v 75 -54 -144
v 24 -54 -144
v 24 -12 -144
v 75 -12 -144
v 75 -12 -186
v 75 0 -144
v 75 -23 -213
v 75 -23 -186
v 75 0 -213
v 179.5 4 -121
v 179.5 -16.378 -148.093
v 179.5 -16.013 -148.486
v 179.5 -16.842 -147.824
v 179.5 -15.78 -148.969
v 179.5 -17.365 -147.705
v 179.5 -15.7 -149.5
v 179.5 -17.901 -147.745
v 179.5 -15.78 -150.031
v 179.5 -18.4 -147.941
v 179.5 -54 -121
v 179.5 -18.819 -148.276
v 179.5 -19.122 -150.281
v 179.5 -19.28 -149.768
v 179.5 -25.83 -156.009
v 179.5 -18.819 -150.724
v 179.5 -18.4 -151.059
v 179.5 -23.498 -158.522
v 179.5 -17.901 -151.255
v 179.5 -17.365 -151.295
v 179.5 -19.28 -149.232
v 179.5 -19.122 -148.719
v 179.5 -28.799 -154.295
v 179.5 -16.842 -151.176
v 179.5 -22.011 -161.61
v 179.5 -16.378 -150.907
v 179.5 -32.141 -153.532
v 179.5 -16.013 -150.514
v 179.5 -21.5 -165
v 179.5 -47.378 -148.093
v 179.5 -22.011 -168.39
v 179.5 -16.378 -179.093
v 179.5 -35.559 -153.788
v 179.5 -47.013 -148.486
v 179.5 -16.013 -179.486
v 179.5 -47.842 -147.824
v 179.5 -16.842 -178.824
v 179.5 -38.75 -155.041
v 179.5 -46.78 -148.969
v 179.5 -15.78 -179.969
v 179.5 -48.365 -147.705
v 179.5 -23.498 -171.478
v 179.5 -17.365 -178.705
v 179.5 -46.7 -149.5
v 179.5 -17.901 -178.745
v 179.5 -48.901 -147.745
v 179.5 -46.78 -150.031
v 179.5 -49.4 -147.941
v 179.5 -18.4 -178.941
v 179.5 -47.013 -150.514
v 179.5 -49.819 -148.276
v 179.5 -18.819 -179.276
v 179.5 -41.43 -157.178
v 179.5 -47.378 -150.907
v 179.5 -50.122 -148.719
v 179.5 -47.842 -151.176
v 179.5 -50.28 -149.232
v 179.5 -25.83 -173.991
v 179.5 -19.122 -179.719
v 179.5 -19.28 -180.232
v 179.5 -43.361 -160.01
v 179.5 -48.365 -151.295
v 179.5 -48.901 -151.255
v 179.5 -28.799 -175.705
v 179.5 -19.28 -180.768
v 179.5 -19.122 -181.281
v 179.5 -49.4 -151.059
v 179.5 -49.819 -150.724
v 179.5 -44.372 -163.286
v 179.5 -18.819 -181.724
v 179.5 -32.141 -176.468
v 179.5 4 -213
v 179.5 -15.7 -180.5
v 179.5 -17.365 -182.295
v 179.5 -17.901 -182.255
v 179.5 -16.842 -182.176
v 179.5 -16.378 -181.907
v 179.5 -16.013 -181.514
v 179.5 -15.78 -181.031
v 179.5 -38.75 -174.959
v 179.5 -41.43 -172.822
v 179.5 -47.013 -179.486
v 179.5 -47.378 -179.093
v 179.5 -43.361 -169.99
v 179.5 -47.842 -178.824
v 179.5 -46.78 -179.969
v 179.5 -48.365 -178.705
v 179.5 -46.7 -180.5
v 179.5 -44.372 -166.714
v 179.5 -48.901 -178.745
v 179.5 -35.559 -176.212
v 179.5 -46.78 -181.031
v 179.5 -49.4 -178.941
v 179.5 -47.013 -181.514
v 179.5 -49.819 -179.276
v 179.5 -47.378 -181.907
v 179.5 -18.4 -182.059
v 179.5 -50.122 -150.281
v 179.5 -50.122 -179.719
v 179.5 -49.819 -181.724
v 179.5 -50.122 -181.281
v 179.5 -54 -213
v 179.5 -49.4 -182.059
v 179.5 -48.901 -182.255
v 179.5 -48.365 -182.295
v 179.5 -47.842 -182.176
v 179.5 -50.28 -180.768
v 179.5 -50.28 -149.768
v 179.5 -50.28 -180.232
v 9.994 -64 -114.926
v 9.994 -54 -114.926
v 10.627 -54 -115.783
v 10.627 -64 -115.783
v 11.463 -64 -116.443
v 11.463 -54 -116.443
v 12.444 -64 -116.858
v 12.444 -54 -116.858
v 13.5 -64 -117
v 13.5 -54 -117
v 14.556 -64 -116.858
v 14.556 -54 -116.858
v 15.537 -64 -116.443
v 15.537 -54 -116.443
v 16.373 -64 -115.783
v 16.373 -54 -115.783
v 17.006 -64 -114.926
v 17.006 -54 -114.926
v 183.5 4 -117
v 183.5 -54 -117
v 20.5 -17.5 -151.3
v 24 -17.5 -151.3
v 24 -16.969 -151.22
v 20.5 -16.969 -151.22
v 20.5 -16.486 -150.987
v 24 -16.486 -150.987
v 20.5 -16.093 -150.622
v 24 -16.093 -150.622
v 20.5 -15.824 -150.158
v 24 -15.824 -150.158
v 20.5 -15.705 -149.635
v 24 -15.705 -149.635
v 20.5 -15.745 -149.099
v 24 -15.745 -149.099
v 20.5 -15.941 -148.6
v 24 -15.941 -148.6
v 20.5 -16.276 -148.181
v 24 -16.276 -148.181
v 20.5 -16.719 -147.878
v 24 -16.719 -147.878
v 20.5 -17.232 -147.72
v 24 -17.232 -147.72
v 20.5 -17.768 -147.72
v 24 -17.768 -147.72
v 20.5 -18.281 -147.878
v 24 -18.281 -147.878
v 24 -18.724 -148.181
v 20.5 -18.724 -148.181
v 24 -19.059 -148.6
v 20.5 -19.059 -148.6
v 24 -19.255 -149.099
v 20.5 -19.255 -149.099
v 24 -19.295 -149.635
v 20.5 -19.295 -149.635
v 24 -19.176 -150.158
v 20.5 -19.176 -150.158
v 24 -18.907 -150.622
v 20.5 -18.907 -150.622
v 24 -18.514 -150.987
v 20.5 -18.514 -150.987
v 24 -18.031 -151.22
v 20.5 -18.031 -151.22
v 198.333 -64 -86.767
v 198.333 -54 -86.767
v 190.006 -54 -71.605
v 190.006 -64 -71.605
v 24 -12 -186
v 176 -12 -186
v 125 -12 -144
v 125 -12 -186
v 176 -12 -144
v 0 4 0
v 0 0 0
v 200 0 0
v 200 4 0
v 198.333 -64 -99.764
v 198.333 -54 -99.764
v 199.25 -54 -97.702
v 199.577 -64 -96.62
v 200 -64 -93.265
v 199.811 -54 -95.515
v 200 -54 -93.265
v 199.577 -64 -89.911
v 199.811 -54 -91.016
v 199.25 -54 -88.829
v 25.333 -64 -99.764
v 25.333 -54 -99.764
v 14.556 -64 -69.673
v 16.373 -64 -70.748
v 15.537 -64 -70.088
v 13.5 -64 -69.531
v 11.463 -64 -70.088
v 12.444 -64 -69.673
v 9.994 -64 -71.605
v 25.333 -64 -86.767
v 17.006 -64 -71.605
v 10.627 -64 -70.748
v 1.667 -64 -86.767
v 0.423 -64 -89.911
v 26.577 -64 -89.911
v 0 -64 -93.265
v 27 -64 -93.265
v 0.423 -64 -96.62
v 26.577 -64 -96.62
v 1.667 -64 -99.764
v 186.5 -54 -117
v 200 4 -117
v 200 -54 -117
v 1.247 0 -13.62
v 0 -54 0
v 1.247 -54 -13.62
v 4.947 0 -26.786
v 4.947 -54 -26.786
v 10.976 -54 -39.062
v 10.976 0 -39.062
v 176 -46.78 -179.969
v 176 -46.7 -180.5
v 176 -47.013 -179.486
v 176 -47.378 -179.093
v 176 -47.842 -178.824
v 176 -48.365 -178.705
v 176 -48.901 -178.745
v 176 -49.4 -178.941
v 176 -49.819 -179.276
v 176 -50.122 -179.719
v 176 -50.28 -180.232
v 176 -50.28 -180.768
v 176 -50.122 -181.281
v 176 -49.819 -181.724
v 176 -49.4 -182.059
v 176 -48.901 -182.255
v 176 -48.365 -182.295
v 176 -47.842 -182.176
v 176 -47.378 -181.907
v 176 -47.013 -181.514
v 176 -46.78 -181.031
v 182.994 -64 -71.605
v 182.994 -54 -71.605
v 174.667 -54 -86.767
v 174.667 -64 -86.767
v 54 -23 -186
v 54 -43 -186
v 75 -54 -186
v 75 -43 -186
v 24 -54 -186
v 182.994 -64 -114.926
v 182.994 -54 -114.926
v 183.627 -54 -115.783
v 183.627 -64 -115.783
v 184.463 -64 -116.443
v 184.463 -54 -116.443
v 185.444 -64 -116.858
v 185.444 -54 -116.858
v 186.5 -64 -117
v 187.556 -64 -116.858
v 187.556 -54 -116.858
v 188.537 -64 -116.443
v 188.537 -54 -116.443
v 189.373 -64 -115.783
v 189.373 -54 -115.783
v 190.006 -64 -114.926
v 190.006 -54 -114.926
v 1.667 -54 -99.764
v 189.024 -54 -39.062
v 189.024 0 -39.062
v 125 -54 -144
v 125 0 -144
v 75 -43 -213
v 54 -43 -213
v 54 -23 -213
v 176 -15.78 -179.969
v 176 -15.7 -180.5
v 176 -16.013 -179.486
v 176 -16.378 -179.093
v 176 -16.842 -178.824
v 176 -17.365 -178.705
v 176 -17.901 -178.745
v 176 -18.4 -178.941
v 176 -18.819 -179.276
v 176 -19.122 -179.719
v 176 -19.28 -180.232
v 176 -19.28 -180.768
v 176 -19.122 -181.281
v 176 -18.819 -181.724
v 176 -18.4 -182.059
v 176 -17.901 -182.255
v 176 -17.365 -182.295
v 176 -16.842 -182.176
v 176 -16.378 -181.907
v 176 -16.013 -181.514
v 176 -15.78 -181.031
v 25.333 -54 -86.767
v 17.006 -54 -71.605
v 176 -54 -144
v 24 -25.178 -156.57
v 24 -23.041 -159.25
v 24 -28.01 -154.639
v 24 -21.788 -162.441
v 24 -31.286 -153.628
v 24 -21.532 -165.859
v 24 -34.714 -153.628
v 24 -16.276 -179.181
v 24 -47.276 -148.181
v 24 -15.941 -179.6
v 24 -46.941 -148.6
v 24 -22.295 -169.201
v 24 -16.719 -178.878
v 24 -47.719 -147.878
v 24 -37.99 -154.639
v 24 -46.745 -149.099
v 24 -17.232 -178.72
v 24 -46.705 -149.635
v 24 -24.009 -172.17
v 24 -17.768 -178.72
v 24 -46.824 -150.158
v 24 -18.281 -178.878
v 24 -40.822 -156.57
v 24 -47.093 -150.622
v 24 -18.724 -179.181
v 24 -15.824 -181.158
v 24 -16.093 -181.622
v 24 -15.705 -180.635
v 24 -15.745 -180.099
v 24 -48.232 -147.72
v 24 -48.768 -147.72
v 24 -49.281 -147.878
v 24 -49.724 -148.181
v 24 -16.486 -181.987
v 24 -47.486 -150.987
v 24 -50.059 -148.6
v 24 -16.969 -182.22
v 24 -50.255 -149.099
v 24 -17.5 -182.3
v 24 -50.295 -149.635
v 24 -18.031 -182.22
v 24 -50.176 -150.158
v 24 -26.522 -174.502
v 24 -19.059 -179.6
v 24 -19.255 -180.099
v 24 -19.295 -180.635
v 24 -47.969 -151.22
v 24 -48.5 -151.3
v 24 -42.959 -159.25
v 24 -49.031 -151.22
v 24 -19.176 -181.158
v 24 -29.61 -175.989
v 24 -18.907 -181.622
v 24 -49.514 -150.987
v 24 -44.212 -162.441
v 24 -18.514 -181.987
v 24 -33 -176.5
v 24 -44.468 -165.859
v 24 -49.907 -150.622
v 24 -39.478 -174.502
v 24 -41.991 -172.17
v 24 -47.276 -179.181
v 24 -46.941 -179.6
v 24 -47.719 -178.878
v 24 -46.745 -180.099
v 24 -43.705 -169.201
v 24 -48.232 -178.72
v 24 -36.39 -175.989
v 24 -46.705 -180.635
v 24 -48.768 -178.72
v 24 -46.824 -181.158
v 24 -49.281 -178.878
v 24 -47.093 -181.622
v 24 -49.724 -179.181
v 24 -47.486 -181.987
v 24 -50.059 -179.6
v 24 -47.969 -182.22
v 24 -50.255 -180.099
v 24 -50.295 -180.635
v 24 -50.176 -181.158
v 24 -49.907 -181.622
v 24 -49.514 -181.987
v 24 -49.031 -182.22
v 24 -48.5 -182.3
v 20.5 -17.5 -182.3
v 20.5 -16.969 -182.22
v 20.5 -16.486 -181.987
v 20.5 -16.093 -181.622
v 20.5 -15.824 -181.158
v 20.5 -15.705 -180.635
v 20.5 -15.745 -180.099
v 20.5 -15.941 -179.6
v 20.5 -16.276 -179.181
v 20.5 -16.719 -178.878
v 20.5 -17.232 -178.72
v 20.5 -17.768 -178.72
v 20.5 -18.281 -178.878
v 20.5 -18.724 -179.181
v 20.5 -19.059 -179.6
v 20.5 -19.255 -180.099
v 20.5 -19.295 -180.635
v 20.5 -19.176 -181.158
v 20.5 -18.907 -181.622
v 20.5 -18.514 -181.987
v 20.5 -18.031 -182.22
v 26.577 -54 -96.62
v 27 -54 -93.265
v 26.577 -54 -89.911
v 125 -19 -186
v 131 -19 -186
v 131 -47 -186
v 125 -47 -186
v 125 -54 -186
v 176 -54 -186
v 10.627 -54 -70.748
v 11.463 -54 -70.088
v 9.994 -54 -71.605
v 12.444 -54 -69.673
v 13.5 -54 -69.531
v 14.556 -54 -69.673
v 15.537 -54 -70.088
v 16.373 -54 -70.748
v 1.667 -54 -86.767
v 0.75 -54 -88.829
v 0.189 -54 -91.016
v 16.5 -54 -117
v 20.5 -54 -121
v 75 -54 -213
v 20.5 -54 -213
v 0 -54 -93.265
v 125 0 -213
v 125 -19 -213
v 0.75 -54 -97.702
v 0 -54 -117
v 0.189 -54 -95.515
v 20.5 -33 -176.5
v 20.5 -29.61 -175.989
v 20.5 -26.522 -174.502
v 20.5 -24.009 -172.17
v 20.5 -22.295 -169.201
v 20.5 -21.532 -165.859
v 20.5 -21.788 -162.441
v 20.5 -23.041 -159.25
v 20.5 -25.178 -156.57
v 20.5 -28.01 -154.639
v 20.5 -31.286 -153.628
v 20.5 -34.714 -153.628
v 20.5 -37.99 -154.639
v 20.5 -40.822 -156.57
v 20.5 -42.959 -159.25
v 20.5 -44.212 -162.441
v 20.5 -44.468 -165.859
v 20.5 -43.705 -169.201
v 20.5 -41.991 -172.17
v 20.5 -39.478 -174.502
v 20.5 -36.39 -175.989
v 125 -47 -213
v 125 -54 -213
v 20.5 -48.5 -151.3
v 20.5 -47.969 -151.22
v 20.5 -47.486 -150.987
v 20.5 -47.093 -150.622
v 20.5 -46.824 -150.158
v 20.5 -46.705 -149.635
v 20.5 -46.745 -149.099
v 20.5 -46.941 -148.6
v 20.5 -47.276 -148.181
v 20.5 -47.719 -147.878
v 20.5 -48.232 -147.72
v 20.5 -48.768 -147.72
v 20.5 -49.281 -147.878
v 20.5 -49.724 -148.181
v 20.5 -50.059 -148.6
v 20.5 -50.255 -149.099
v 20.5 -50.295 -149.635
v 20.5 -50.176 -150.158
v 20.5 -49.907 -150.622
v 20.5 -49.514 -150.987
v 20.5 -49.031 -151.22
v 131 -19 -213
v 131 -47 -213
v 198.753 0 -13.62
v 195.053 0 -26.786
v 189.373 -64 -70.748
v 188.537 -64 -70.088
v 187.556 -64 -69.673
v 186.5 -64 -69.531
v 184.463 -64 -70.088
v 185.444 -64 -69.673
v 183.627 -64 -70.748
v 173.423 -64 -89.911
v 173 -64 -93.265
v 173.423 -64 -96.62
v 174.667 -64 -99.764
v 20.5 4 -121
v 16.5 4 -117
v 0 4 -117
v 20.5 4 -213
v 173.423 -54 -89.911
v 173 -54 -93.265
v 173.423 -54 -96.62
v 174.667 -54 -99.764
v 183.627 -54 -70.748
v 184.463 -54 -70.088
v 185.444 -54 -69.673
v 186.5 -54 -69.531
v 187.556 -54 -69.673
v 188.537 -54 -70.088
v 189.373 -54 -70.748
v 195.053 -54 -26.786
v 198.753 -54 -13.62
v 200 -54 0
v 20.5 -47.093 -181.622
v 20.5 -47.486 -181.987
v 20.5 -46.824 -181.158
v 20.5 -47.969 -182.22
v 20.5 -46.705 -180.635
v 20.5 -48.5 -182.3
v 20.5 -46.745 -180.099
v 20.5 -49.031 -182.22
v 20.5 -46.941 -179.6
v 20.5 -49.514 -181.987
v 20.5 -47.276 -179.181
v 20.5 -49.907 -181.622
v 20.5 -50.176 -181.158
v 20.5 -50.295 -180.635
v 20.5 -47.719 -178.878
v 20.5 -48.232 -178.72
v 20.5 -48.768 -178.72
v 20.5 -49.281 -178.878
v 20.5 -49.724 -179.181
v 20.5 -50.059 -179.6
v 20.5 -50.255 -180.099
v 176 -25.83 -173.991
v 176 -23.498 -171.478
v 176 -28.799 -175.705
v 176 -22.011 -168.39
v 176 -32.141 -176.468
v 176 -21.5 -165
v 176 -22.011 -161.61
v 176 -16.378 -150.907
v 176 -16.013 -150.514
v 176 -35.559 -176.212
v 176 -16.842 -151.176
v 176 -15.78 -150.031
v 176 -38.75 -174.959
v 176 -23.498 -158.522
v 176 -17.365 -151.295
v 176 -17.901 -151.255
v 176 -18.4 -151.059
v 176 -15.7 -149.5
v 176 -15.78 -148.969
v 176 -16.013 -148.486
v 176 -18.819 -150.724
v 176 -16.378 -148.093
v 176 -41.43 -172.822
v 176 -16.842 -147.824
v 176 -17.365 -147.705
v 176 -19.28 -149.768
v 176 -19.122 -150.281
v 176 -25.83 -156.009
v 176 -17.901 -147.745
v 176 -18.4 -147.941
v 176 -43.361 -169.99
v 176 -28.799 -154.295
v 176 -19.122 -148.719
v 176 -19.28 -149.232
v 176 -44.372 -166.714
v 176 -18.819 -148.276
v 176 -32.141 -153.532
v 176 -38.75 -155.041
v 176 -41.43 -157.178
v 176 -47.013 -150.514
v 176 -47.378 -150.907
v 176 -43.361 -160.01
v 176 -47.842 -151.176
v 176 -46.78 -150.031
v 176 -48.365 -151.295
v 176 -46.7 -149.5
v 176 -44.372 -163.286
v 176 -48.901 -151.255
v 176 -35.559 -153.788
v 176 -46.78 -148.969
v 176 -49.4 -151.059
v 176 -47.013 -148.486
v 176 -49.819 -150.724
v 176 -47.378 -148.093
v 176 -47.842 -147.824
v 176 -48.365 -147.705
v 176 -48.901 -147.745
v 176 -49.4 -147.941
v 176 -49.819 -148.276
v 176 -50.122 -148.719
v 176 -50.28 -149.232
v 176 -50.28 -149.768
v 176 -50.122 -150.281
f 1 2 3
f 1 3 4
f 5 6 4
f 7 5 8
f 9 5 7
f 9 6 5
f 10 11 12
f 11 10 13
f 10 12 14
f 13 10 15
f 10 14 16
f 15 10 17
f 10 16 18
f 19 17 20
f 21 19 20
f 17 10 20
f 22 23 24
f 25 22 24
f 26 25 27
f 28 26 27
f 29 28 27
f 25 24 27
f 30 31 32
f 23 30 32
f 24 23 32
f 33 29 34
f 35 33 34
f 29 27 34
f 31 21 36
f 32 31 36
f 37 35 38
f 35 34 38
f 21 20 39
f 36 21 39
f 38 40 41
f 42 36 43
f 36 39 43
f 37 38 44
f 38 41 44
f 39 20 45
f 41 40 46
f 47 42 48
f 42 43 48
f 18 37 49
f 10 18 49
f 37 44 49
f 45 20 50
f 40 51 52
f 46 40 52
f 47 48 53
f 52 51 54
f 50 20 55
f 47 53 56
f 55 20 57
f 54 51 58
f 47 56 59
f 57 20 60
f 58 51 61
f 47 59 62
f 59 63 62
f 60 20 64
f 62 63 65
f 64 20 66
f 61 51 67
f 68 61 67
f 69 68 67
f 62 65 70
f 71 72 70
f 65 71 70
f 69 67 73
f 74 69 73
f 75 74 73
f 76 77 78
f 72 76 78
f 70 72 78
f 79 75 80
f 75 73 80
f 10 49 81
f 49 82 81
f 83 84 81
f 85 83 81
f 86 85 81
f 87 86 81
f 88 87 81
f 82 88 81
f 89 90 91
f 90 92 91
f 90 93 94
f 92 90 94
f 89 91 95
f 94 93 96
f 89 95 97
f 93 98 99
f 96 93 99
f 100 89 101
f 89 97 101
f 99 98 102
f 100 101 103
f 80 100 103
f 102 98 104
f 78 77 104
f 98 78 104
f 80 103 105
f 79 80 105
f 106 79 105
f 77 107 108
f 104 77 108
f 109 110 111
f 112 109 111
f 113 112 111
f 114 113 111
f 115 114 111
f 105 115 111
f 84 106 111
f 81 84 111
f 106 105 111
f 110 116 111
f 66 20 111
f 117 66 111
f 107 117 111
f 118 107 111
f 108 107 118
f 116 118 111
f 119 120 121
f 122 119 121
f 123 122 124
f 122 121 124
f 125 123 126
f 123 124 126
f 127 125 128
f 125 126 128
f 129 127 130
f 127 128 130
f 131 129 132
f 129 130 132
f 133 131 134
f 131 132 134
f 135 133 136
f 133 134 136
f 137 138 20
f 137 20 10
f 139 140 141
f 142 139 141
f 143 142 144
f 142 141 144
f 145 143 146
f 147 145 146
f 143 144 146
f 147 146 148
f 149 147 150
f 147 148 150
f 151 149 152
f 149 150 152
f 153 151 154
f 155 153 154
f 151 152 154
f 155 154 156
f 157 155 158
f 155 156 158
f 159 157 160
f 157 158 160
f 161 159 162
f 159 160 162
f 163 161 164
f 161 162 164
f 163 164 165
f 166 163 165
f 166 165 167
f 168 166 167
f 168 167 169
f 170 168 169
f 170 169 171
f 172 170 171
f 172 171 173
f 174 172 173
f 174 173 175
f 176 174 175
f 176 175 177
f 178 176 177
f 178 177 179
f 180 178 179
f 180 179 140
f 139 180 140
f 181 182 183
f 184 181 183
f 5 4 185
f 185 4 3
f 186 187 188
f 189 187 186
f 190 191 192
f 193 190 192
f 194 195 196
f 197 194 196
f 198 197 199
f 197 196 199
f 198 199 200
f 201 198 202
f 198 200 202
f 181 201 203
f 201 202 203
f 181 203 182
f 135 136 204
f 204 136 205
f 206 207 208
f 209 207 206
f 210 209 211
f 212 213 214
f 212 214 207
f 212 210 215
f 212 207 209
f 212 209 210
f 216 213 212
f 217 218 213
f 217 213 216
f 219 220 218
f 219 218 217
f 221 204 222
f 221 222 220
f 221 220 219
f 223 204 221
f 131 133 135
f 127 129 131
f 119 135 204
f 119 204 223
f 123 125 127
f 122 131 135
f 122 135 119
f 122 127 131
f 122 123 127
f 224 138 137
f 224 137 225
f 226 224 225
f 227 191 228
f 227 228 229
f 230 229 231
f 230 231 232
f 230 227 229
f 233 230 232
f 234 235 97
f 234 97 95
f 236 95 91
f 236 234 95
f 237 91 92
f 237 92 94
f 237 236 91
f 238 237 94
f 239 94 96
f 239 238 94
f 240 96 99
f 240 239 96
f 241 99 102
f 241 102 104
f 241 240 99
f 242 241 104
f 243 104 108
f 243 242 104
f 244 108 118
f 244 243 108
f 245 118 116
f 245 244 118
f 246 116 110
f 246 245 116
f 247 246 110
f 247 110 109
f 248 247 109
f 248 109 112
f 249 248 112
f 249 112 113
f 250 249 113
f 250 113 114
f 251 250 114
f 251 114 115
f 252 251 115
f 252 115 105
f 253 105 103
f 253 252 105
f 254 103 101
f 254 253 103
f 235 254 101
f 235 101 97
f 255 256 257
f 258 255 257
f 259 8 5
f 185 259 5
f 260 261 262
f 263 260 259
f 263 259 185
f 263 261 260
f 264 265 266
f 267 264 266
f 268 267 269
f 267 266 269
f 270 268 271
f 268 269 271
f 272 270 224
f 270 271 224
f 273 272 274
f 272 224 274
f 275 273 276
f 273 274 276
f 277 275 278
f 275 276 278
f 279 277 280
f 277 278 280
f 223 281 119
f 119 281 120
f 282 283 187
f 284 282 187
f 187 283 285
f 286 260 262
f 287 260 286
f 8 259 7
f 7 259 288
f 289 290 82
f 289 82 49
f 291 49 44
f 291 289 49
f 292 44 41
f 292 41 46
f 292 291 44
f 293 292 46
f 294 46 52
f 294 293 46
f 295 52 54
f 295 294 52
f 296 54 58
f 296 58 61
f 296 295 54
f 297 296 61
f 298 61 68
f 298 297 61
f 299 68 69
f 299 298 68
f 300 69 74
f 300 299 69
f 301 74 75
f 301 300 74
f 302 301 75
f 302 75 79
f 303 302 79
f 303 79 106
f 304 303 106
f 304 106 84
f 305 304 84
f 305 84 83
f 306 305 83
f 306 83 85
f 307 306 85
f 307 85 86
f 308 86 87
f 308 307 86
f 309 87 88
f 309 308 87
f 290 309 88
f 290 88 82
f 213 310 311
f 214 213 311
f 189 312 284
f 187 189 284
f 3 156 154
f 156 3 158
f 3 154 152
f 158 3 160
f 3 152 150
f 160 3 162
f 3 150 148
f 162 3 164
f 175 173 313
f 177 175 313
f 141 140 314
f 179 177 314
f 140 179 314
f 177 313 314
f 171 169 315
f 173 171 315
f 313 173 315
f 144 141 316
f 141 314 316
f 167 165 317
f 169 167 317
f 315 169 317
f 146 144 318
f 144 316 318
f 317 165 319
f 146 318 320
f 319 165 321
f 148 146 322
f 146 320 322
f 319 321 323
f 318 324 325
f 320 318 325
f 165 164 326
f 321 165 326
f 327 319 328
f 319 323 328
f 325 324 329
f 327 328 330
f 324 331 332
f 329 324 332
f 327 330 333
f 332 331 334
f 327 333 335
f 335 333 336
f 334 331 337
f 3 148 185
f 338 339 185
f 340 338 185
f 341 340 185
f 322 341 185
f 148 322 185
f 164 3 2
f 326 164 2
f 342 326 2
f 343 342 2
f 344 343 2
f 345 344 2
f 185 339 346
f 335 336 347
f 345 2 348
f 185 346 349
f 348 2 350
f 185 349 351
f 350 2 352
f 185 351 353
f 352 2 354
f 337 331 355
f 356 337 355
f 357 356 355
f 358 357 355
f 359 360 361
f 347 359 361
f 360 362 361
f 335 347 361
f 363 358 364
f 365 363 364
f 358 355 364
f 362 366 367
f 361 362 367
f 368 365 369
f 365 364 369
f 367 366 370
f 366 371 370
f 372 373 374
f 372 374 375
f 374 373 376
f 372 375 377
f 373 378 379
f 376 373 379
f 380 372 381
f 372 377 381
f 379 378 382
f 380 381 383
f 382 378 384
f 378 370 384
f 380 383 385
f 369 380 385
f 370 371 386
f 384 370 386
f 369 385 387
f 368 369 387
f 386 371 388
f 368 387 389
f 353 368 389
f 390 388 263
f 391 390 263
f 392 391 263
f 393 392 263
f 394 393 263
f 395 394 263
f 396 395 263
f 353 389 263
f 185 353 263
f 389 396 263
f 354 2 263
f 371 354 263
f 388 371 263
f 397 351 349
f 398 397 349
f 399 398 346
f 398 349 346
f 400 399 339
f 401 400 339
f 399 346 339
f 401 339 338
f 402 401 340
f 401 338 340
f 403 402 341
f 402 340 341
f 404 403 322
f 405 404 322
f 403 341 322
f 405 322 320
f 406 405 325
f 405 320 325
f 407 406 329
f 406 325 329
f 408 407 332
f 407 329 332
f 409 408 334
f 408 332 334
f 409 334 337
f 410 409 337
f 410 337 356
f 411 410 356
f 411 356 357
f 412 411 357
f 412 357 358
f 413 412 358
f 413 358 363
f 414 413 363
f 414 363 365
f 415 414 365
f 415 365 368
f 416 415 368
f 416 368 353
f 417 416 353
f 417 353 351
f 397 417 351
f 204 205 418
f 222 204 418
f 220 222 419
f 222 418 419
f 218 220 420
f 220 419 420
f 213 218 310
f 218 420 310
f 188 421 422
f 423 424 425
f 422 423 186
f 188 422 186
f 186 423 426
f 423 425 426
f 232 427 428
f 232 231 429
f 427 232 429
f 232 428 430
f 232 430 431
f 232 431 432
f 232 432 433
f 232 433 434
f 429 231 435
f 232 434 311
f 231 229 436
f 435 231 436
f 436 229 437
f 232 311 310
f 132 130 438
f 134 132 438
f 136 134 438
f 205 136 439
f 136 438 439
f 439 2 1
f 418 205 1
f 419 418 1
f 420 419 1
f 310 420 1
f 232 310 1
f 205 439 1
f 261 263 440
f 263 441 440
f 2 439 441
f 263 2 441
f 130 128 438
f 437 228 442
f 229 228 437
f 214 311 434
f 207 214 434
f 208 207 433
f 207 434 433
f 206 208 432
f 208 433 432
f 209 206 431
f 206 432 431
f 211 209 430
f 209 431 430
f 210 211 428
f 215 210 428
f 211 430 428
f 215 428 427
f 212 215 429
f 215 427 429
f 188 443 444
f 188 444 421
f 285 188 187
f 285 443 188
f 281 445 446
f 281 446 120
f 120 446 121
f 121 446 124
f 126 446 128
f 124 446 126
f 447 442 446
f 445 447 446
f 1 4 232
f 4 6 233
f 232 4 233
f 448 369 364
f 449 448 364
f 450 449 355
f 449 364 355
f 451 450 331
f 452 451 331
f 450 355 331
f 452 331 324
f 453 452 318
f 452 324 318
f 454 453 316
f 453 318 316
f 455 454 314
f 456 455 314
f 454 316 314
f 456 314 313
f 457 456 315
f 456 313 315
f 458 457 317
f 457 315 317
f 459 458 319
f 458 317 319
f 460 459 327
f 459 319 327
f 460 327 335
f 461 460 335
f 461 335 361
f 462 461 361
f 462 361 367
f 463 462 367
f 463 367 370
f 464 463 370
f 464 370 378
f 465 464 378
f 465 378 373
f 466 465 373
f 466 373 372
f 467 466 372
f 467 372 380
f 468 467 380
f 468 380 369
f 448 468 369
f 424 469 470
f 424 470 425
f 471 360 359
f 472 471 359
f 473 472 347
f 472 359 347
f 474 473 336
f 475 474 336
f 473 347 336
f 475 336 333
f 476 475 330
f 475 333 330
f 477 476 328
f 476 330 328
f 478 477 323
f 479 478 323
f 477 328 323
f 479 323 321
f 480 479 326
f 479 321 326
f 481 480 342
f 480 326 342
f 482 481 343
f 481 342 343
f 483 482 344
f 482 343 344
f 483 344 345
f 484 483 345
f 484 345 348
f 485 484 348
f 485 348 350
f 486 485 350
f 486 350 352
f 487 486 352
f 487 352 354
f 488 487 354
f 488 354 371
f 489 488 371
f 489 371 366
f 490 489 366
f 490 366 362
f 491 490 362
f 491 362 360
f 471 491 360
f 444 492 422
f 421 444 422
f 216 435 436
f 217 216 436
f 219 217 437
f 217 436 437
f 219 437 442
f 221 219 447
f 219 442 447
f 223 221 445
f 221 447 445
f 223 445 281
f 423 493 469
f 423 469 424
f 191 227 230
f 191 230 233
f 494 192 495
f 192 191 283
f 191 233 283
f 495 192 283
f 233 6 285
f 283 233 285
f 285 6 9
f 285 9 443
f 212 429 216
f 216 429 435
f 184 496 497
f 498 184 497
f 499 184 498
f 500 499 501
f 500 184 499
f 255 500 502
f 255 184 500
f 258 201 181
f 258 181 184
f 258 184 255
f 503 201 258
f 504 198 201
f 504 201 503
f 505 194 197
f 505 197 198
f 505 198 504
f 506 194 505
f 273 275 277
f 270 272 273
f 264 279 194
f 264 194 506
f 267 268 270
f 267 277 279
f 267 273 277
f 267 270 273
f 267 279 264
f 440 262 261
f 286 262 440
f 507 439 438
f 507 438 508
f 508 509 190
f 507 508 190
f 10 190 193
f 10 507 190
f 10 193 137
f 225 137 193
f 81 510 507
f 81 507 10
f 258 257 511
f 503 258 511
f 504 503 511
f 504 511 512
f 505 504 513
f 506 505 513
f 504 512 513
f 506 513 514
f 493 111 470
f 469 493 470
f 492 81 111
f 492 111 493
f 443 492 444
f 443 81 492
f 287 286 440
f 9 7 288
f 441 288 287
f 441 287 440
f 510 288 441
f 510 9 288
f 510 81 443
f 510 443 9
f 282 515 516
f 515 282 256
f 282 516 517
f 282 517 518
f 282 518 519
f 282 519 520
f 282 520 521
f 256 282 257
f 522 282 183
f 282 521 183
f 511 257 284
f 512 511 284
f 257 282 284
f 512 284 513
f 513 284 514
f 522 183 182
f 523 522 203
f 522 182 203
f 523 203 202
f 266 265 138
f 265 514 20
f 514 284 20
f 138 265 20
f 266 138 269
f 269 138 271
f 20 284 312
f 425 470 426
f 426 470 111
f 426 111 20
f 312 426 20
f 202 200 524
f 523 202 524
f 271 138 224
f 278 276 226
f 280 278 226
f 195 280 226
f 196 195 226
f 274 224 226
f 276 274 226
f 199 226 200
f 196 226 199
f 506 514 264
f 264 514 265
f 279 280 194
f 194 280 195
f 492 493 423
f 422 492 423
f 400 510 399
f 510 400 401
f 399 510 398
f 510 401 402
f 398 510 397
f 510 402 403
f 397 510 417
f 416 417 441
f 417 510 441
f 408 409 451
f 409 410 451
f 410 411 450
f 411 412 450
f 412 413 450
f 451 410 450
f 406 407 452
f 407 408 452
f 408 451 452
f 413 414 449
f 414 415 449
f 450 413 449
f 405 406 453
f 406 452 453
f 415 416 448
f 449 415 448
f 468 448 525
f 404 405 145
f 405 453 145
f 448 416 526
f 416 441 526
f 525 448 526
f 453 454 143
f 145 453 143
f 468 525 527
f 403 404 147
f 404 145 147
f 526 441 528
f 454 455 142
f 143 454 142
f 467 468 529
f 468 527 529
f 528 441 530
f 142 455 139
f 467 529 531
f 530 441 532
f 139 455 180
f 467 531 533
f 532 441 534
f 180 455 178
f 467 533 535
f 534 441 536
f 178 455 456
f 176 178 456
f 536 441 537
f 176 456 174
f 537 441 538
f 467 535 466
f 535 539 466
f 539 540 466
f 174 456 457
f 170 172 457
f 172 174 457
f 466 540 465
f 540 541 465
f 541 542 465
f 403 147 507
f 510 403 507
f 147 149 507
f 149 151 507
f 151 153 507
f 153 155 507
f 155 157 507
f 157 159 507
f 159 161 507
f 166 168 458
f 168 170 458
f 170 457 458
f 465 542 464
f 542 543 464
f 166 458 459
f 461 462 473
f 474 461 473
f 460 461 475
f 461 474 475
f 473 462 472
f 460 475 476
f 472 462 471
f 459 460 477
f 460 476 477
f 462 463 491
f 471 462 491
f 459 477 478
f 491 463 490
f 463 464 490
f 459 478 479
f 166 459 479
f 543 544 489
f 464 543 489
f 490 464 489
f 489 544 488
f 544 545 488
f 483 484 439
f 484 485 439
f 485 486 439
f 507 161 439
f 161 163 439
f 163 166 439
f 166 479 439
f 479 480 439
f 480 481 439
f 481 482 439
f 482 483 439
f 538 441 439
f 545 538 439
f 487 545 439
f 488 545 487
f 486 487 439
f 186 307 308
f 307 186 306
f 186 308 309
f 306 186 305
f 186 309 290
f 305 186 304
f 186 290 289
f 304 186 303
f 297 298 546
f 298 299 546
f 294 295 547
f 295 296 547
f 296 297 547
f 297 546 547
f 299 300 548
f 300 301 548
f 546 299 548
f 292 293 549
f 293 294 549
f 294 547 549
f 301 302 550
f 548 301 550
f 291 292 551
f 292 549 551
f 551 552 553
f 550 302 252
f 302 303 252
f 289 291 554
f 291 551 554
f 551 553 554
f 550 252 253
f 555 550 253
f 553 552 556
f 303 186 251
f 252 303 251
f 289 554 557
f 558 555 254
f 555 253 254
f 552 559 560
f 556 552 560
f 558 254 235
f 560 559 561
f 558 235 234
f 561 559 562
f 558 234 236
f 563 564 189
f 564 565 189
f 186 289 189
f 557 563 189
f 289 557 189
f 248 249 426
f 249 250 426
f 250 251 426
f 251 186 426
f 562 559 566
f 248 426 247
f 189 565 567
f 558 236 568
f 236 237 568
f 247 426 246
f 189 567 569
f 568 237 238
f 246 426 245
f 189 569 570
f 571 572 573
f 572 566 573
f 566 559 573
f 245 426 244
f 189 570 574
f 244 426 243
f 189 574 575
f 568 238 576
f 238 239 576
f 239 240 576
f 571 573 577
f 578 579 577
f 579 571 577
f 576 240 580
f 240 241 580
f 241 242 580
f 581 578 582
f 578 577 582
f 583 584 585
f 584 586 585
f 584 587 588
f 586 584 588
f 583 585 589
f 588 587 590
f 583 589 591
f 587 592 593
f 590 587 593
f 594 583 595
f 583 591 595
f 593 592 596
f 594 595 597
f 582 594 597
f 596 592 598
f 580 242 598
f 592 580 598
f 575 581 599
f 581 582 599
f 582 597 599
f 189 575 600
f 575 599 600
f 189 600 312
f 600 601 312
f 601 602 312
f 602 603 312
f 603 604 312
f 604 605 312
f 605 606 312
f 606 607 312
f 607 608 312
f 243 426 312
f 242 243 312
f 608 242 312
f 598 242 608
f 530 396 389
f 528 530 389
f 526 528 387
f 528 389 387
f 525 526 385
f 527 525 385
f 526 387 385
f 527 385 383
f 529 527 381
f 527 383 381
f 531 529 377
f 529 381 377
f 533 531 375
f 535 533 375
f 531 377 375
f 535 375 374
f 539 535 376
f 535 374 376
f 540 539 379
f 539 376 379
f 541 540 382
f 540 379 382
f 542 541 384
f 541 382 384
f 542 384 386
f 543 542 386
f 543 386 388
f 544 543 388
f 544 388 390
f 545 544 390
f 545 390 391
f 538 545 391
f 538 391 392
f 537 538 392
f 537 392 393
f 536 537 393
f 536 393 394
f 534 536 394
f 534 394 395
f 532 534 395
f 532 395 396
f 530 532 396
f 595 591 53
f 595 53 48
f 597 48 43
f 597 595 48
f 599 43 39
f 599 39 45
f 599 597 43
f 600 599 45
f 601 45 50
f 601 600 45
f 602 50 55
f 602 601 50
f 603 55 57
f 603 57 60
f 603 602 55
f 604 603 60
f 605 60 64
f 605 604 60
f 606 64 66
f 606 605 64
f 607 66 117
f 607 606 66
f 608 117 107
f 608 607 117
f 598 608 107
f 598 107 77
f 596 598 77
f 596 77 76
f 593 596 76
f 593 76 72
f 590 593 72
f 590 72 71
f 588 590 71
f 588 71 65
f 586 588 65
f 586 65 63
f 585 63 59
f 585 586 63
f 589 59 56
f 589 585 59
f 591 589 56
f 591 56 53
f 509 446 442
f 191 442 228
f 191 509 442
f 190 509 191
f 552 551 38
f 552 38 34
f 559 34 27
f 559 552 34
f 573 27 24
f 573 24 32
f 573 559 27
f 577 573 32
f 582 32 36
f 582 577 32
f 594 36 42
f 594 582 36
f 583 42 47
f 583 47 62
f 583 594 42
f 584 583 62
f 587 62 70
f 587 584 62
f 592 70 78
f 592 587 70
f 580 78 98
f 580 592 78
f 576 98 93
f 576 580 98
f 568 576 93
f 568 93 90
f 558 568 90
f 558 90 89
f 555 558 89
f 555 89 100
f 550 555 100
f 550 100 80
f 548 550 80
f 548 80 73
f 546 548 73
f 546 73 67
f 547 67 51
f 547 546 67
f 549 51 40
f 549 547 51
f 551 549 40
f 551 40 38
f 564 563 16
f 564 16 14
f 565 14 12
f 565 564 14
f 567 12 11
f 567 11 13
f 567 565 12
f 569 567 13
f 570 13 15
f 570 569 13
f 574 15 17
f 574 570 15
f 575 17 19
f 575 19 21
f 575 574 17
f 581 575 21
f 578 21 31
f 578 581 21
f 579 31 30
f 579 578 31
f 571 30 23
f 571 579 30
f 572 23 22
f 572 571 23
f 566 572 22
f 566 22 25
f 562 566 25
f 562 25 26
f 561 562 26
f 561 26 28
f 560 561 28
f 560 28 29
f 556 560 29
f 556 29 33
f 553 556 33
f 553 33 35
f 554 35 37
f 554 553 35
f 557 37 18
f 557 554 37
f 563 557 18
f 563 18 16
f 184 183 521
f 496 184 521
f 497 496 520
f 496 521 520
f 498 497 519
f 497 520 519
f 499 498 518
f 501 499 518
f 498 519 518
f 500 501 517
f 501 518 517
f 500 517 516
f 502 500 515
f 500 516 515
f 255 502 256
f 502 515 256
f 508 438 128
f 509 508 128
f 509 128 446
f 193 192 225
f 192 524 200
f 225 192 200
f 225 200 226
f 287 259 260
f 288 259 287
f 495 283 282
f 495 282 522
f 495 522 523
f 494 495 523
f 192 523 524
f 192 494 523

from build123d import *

# Parameters (mm, degrees)
SKETCH_1_W              = 200
SKETCH_1_H              = 213
EXTRUDE_1_DEPTH         = 4
EXTRUDE_2_DEPTH         = 54
CUT_EXTRUDE_2_DEPTH     = 298.880848663
CUT_EXTRUDE_3_DEPTH     = 42
SKETCH_7_R              = 1.8
SKETCH_7_R_2            = 11.5
CUT_EXTRUDE_4_DEPTH     = 282.53330176
MIRROR_START            = 176
MIRROR_1_OUTLINE_R      = 1.8
MIRROR_1_OUTLINE_R_2    = 11.5
MIRROR_1_DEPTH          = 3.5
CUT_EXTRUDE_START       = -21
CUT_EXTRUDE_5_OUTLINE_W = 27
CUT_EXTRUDE_5_OUTLINE_H = 20
CUT_EXTRUDE_5_DEPTH     = 21
CUT_EXTRUDE_START_2     = -6
CUT_EXTRUDE_6_OUTLINE_W = 27
CUT_EXTRUDE_6_OUTLINE_H = 28
CUT_EXTRUDE_6_DEPTH     = 6
CHAMFER_1_SIZE          = 4
CUT_EXTRUDE_START_3     = -54
CUT_EXTRUDE_7_DEPTH     = 54
EXTRUDE_3_DEPTH         = 10


# Read off the part's stored shape, not the designer's step: 镜向1, 切除-拉伸5, 切除-拉伸6
with BuildPart() as part:
    # 草图1 → 凸台-拉伸1 (new body)
    with BuildSketch(Plane(origin=(0, 0, 0), x_dir=(1, 0, 0), z_dir=(0, 1, 0))):
        with Locations((100, 106.5)):
            Rectangle(SKETCH_1_W, SKETCH_1_H)
    extrude(amount=EXTRUDE_1_DEPTH)

    # 草图1<4> → 凸台-拉伸2 (add)
    with BuildSketch(Plane(origin=(0, 0, 0), x_dir=(1, 0, 0), z_dir=(0, 1, 0))):
        with BuildLine():
            Line((0, 213), (0, 0))
            ThreePointArc((0, 0), (21.966991411, 53.033008589), (75, 75))
            Line((75, 75), (75, 213))
            Line((75, 213), (0, 213))
        make_face()
        with BuildLine():
            Line((125, 213), (125, 75))
            ThreePointArc((125, 75), (178.033008589, 53.033008589), (200, 0))
            Line((200, 0), (200, 213))
            Line((200, 213), (125, 213))
        make_face()
    extrude(amount=-EXTRUDE_2_DEPTH)

    # 草图3 → 切除-拉伸2 (cut, through all)
    with BuildSketch(Plane.XZ.offset(54)):
        Polygon((20.5, -186), (20.5, -165), (20.5, -144), (20.5, -117), (0, -117), (0, -213), (20.5, -213), align=None)
        Polygon((179.5, -117), (200, -117), (200, -213), (179.5, -213), (179.5, -165), align=None)
    extrude(amount=-CUT_EXTRUDE_2_DEPTH, mode=Mode.SUBTRACT)

    # 草图5 → 切除-拉伸3 (cut)
    with BuildSketch(Plane.XZ.offset(54)):
        Polygon((176, -165), (176, -144), (125, -144), (125, -186), (176, -186), align=None)
        Polygon((24, -165), (24, -144), (75, -144), (75, -186), (24, -186), align=None)
    extrude(amount=-CUT_EXTRUDE_3_DEPTH, mode=Mode.SUBTRACT)

    # 草图7 → 切除-拉伸4 (cut, through all)
    with BuildSketch(Plane(origin=(24, 0, 0), x_dir=(0, 0, -1), z_dir=(1, 0, 0))):
        with Locations((180.5, -17.5)):
            Circle(SKETCH_7_R)
        with Locations((149.5, -17.5)):
            Circle(SKETCH_7_R)
        with Locations((165, -33)):
            Circle(SKETCH_7_R_2)
        with Locations((180.5, -48.5)):
            Circle(SKETCH_7_R)
        with Locations((149.5, -48.5)):
            Circle(SKETCH_7_R)
    extrude(amount=-CUT_EXTRUDE_4_DEPTH, mode=Mode.SUBTRACT)

    # 镜向1 outline → 镜向1 (cut)
    with BuildSketch(Plane.YZ.offset(MIRROR_START)):
        with Locations((-17.5, -180.5)):
            Circle(MIRROR_1_OUTLINE_R)
        with Locations((-17.5, -149.5)):
            Circle(MIRROR_1_OUTLINE_R)
        with Locations((-33, -165)):
            Circle(MIRROR_1_OUTLINE_R_2)
        with Locations((-48.5, -180.5)):
            Circle(MIRROR_1_OUTLINE_R)
        with Locations((-48.5, -149.5)):
            Circle(MIRROR_1_OUTLINE_R)
    extrude(amount=MIRROR_1_DEPTH, mode=Mode.SUBTRACT)

    # 切除-拉伸5 outline → 切除-拉伸5 (cut)
    with BuildSketch(Plane(origin=(75, 0, 0), x_dir=(0, 0, -1), z_dir=(1, 0, 0)).offset(CUT_EXTRUDE_START)):
        with Locations((199.5, -33)):
            Rectangle(CUT_EXTRUDE_5_OUTLINE_W, CUT_EXTRUDE_5_OUTLINE_H)
    extrude(amount=CUT_EXTRUDE_5_DEPTH, mode=Mode.SUBTRACT)

    # 切除-拉伸6 outline → 切除-拉伸6 (cut)
    with BuildSketch(Plane.ZY.offset(-125).offset(CUT_EXTRUDE_START_2)):
        with Locations((-199.5, -33)):
            Rectangle(CUT_EXTRUDE_6_OUTLINE_W, CUT_EXTRUDE_6_OUTLINE_H)
    extrude(amount=CUT_EXTRUDE_6_DEPTH, mode=Mode.SUBTRACT)

    # 倒角1
    chamfer_1_edges = [part.edges().sort_by_distance(p)[0] for p in [
        (20.5, -25, -117),
        (179.5, -25, -117),
    ]]
    chamfer(chamfer_1_edges, length=CHAMFER_1_SIZE)

    # 草图11 → 切除-拉伸7 (cut)
    with BuildSketch(Plane.XZ.offset(54).offset(CUT_EXTRUDE_START_3)):
        with BuildLine():
            Line((75, -144), (10.975621098, -39.0625))
            ThreePointArc((10.975621098, -39.0625), (38.289562111, -65.401404801), (75, -75))
            Line((75, -75), (75, -144))
        make_face()
        with BuildLine():
            Line((125, -144), (125, -75))
            ThreePointArc((125, -75), (161.710437889, -65.401404801), (189.024378902, -39.0625))
            Line((189.024378902, -39.0625), (125, -144))
        make_face()
    extrude(amount=CUT_EXTRUDE_7_DEPTH, mode=Mode.SUBTRACT)

    # 草图12 → 凸台-拉伸3 (add)
    with BuildSketch(Plane(origin=(0, -54, 0), x_dir=(-1, 0, 0), z_dir=(0, -1, 0))):
        with BuildLine():
            Line((-9.993972793, 71.605361452), (-1.667158175, 86.766701767))
            ThreePointArc((-1.667158175, 86.766701767), (0, 93.265459675), (-1.667158175, 99.764217583))
            Line((-1.667158175, 99.764217583), (-9.993972793, 114.925557899))
            ThreePointArc((-9.993972793, 114.925557899), (-13.5, 117), (-17.006027207, 114.925557899))
            Line((-17.006027207, 114.925557899), (-25.332841825, 99.764217583))
            ThreePointArc((-25.332841825, 99.764217583), (-27, 93.265459675), (-25.332841825, 86.766701767))
            Line((-25.332841825, 86.766701767), (-17.006027207, 71.605361452))
            ThreePointArc((-17.006027207, 71.605361452), (-13.5, 69.53091935), (-9.993972793, 71.605361452))
        make_face()
        with BuildLine():
            Line((-190.006027207, 114.925557899), (-198.332841825, 99.764217583))
            ThreePointArc((-198.332841825, 99.764217583), (-200, 93.265459675), (-198.332841825, 86.766701767))
            Line((-198.332841825, 86.766701767), (-190.006027207, 71.605361452))
            ThreePointArc((-190.006027207, 71.605361452), (-186.5, 69.53091935), (-182.993972793, 71.605361452))
            Line((-182.993972793, 71.605361452), (-174.667158175, 86.766701767))
            ThreePointArc((-174.667158175, 86.766701767), (-173, 93.265459675), (-174.667158175, 99.764217583))
            Line((-174.667158175, 99.764217583), (-182.993972793, 114.925557899))
            ThreePointArc((-182.993972793, 114.925557899), (-186.5, 117), (-190.006027207, 114.925557899))
        make_face()
    extrude(amount=EXTRUDE_3_DEPTH)


solid = part.part
